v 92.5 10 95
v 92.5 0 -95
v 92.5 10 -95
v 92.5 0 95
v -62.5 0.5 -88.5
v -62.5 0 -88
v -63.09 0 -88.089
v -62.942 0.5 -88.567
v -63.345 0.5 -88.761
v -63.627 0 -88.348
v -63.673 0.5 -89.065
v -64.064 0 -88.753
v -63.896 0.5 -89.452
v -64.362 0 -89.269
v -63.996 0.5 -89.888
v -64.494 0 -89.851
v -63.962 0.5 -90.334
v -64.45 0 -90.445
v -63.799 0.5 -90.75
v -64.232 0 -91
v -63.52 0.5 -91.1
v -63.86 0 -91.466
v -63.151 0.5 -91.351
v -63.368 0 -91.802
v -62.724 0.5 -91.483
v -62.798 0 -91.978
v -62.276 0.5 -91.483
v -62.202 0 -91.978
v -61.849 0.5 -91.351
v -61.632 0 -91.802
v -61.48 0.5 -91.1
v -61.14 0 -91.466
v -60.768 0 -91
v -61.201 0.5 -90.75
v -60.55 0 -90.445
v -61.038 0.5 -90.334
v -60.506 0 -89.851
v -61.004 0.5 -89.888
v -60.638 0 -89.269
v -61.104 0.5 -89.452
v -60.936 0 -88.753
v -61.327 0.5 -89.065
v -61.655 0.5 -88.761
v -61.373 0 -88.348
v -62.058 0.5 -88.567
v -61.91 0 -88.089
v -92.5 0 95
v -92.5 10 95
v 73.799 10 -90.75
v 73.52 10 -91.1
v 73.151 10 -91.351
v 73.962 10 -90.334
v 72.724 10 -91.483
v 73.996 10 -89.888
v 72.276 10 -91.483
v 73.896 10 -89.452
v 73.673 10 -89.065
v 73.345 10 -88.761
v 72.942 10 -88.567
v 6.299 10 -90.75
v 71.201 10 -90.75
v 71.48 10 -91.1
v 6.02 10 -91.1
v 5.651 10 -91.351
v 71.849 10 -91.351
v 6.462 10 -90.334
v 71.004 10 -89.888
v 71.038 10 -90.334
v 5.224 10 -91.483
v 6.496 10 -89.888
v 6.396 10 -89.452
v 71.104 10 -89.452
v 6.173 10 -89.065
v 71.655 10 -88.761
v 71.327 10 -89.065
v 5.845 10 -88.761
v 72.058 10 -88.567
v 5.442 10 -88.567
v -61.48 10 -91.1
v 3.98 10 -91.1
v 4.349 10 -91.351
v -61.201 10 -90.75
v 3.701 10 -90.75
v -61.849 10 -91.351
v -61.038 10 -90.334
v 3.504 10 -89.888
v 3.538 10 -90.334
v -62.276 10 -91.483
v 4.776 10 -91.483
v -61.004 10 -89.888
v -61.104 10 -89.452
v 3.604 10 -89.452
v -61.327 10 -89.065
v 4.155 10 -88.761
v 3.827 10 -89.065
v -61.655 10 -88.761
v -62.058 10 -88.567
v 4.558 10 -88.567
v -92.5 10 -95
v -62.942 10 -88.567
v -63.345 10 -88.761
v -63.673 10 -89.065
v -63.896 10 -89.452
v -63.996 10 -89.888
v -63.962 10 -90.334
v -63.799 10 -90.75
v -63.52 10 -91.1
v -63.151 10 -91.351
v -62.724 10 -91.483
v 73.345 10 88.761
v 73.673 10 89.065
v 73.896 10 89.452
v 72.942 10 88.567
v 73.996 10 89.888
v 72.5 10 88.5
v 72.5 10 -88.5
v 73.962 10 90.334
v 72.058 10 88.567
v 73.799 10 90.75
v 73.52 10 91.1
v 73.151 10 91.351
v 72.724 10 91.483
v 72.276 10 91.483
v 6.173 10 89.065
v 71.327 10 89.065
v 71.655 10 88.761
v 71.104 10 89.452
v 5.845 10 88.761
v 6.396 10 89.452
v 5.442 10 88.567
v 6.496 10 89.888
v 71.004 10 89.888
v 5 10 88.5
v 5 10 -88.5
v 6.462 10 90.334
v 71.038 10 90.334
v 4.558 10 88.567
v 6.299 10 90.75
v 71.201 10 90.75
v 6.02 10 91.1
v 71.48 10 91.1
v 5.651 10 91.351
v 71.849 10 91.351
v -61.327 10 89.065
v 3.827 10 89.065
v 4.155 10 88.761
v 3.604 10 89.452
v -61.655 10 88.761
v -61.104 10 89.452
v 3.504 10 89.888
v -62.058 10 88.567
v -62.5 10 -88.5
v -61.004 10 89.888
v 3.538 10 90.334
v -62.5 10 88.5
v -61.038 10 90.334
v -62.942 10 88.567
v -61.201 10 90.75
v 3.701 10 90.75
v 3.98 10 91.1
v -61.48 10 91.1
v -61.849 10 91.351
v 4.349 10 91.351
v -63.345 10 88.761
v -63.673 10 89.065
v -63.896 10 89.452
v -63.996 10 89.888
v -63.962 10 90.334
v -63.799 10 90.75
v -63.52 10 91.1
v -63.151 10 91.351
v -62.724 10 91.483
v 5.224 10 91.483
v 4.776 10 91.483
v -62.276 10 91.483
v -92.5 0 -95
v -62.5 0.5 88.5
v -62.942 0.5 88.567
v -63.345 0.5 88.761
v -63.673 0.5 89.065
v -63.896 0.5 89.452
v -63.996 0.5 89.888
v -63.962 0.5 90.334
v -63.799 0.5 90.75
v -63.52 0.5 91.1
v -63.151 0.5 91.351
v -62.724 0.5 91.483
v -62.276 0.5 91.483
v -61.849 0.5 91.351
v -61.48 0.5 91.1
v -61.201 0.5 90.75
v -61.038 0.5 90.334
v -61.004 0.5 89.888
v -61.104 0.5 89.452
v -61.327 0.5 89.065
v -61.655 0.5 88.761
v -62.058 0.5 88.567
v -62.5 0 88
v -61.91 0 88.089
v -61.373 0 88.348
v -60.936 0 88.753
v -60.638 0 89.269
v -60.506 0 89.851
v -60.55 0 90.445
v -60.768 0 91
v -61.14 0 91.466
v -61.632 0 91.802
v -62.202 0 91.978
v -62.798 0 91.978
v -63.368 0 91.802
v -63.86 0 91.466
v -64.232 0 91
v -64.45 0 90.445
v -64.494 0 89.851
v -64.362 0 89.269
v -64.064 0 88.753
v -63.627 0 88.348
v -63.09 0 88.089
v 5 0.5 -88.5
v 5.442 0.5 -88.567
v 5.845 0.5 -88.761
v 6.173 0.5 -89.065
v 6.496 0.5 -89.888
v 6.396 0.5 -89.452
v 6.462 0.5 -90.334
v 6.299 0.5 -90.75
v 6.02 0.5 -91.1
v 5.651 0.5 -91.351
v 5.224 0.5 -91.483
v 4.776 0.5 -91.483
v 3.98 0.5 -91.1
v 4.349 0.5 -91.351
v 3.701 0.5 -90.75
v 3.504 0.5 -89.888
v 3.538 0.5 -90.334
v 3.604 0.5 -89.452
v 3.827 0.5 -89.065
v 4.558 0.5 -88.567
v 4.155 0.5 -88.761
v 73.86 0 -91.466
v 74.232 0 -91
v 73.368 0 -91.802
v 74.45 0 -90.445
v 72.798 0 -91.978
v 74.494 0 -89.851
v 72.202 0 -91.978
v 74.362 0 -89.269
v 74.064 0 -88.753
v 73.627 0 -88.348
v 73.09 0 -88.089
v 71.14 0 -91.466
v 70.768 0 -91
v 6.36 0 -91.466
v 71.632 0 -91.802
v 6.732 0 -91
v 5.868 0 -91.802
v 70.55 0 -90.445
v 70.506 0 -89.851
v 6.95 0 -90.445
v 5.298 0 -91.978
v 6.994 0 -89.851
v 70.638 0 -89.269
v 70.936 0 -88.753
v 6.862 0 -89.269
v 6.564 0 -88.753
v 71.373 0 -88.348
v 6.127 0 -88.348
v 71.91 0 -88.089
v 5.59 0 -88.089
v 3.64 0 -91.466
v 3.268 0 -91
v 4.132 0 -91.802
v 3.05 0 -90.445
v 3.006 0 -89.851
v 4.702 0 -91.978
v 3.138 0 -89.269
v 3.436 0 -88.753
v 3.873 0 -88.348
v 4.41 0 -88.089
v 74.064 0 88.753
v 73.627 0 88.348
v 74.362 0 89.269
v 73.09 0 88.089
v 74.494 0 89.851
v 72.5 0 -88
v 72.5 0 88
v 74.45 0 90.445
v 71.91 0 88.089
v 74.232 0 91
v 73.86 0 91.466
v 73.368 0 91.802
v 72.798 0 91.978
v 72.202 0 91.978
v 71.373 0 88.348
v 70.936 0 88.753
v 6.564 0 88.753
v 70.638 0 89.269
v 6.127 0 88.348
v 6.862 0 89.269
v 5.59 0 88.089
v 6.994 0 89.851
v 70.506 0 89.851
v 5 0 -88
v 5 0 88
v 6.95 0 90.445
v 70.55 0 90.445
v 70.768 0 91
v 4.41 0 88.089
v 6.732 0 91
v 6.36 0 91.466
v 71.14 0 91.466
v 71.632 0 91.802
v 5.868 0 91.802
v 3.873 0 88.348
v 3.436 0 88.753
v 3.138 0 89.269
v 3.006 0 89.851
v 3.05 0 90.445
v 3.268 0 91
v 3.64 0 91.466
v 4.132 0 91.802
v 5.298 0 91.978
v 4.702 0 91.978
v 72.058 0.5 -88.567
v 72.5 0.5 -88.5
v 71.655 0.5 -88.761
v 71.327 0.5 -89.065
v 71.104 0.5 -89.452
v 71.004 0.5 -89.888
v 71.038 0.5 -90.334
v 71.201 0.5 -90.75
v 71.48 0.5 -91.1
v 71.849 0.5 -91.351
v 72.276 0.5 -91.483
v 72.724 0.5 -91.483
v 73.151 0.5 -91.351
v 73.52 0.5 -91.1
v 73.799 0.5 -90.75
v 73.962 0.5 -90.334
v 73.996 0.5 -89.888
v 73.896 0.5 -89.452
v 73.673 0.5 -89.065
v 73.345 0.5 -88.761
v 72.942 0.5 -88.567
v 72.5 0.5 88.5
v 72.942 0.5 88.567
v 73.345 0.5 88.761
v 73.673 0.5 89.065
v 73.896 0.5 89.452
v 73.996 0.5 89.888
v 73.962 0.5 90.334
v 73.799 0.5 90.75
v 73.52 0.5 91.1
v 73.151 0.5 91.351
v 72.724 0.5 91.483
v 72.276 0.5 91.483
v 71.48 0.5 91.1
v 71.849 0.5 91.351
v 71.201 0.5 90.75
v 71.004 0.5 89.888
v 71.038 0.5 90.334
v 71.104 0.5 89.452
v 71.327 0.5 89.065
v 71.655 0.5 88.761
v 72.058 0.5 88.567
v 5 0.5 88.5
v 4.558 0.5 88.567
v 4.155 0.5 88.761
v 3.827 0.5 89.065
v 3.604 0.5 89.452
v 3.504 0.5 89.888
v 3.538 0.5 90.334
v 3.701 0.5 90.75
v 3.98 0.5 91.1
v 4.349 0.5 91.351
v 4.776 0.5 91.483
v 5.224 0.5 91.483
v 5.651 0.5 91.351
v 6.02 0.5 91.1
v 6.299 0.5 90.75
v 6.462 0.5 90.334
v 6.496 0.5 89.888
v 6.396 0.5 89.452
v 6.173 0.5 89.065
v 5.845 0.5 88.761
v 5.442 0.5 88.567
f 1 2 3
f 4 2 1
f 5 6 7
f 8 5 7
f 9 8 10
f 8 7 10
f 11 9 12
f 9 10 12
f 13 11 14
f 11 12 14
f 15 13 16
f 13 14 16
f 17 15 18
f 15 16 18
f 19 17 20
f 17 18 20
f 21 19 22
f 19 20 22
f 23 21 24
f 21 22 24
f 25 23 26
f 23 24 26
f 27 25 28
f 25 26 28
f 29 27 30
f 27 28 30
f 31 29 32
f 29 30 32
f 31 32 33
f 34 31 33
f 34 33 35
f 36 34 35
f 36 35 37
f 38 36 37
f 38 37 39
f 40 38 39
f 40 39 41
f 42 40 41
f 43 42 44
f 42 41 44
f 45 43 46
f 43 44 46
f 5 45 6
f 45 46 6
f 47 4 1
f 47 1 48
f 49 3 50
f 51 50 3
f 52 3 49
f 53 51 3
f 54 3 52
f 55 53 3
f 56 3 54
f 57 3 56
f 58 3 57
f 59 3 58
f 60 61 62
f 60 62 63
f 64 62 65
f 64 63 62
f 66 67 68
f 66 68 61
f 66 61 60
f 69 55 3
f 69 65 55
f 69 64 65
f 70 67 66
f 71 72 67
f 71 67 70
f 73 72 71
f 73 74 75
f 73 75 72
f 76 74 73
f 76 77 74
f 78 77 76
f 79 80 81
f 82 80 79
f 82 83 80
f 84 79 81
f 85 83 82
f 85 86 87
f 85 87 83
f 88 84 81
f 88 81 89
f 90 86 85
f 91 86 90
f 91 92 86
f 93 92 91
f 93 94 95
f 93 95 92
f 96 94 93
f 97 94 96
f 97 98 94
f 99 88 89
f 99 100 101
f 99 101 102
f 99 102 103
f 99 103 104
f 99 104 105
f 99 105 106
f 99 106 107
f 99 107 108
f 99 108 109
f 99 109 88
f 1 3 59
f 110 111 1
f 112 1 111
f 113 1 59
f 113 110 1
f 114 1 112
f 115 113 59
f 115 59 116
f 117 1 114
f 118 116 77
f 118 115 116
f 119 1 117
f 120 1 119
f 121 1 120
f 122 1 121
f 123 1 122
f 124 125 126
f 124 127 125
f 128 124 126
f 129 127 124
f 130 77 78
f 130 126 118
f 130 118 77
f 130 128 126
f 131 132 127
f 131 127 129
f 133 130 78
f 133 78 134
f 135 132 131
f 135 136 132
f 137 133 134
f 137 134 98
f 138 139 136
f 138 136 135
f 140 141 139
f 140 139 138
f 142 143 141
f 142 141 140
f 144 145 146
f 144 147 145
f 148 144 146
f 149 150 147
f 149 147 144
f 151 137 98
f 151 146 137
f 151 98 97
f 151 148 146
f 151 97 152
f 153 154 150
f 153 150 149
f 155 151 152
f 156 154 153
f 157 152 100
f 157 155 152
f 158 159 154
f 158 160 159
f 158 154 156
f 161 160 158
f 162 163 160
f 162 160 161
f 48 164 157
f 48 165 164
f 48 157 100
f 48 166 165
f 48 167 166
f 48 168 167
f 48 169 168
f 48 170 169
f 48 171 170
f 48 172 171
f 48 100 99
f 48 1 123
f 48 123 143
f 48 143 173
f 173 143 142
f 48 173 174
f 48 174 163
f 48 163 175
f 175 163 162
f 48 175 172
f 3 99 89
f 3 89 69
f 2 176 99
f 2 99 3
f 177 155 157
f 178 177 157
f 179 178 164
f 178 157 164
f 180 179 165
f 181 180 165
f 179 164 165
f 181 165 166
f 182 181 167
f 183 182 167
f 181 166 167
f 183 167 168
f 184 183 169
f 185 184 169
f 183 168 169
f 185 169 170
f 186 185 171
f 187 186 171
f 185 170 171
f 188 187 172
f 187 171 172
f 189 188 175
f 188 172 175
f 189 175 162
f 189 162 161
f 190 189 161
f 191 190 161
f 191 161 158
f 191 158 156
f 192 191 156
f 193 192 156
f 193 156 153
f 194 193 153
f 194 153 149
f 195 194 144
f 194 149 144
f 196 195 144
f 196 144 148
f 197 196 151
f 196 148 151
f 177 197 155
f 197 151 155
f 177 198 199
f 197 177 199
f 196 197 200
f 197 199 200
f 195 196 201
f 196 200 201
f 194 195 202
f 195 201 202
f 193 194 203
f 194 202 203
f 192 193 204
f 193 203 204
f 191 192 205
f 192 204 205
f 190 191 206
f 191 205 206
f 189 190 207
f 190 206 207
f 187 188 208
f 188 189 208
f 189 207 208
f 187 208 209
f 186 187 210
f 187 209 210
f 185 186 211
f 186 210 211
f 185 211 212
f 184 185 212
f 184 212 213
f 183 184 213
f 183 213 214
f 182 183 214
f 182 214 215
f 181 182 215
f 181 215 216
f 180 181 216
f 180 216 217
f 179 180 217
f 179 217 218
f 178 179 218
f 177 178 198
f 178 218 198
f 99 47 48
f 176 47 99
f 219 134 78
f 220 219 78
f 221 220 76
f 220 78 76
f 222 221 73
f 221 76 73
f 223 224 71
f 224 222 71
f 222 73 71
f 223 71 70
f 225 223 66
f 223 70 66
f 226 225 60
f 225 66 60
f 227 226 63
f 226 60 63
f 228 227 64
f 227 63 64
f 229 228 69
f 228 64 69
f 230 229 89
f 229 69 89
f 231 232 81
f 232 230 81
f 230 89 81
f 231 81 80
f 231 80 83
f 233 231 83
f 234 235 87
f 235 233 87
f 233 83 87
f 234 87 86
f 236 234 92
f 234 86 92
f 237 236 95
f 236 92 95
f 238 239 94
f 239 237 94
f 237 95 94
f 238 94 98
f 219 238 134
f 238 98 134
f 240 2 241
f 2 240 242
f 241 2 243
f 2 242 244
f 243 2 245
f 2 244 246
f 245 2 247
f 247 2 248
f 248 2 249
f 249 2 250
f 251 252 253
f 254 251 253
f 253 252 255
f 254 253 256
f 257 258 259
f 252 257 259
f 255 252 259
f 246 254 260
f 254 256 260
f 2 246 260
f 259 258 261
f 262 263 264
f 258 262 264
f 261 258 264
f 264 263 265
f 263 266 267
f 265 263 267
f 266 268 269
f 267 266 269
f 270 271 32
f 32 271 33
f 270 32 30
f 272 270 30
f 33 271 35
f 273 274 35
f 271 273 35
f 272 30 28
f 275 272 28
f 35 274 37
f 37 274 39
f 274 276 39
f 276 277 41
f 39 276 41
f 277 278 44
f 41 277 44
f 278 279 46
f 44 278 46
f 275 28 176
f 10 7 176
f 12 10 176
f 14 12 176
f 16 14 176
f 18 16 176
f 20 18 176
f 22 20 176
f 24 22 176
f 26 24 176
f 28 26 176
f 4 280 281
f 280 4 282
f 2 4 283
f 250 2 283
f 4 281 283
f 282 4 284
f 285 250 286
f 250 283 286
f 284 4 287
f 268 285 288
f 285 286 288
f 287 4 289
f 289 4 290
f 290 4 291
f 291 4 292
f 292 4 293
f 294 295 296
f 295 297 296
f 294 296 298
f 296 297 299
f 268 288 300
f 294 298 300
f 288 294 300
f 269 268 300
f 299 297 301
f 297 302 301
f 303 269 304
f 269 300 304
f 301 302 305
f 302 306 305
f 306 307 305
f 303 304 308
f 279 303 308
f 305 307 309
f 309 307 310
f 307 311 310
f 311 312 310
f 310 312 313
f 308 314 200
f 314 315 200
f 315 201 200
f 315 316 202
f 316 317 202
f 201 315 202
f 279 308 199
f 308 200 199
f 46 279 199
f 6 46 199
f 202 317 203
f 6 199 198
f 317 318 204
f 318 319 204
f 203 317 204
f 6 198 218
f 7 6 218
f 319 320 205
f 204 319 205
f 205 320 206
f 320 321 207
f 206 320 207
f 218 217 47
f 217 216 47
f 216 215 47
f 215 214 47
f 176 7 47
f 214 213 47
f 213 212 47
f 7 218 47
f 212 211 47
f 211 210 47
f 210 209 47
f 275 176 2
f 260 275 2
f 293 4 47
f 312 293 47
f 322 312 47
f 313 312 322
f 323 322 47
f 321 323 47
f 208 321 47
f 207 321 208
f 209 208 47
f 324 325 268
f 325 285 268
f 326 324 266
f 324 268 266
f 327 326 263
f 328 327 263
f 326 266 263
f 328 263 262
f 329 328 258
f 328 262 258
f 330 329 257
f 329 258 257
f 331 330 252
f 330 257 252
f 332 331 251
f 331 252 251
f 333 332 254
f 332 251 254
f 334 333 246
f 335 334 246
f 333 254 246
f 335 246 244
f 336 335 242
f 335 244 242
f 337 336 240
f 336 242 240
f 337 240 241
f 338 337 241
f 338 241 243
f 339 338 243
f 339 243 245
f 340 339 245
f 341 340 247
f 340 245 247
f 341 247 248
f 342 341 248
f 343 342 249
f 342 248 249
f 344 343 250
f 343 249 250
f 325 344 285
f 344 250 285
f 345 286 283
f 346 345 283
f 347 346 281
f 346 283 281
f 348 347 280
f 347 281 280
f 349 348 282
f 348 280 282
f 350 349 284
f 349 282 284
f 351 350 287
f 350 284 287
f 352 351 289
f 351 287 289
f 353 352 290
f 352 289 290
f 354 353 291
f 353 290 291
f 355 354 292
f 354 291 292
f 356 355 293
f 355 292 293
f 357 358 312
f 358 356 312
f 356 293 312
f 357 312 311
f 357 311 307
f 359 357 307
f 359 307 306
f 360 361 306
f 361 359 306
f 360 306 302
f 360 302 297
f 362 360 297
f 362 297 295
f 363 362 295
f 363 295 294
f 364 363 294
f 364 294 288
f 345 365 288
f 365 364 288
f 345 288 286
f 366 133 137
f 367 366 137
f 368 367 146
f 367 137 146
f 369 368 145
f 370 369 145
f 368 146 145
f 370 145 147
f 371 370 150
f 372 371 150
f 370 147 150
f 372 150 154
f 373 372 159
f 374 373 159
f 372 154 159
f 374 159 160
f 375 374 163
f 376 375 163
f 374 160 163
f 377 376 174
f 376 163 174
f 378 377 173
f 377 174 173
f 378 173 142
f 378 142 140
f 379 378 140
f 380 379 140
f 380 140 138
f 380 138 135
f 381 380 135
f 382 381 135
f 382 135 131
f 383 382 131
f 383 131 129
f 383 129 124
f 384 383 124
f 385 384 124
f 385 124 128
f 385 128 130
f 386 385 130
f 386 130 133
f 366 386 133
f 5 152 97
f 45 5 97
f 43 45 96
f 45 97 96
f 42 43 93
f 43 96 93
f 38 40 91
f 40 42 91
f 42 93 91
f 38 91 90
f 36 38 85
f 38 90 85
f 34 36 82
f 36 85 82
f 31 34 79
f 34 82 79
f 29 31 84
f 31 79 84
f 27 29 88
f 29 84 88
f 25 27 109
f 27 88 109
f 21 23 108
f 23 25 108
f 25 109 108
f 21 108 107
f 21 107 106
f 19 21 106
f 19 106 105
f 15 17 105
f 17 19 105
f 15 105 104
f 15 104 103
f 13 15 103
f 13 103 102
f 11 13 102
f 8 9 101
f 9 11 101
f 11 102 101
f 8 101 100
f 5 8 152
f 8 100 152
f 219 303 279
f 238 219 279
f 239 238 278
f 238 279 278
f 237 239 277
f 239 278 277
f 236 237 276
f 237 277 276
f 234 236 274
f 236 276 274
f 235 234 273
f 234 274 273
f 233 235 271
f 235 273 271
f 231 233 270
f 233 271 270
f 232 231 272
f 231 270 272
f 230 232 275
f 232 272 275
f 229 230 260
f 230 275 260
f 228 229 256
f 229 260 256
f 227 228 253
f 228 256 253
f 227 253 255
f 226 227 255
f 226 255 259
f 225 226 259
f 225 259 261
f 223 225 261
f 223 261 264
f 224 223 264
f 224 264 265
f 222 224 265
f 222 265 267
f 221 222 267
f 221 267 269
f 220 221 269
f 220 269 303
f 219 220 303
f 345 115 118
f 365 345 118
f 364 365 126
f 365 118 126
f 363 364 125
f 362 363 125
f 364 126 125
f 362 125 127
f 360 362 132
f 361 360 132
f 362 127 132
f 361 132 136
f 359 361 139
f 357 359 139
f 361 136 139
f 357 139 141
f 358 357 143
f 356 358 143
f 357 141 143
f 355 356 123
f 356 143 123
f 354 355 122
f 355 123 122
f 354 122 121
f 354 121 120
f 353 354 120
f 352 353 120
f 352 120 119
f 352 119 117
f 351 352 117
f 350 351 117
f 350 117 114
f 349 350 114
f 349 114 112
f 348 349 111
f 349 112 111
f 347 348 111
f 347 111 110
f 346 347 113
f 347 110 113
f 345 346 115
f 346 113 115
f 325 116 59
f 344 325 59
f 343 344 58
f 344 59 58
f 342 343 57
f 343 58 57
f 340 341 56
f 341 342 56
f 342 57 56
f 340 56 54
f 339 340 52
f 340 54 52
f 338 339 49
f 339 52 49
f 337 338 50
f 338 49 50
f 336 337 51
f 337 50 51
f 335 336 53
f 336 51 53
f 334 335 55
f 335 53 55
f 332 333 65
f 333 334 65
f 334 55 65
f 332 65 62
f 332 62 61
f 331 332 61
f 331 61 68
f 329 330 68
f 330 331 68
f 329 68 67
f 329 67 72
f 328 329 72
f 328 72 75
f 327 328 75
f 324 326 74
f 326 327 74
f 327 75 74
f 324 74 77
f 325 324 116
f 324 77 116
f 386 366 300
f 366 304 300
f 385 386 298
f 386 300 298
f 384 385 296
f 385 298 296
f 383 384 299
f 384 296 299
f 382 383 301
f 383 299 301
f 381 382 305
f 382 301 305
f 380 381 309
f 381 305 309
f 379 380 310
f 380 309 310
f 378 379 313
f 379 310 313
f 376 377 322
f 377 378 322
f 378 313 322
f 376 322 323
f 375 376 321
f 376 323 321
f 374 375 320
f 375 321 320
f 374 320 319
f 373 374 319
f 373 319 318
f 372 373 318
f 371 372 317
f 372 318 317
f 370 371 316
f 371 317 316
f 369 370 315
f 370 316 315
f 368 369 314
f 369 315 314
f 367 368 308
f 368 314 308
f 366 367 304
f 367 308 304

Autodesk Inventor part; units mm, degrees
ref_plane "YZ Plane" through (0, 0, 0) normal (1, 0, 0) x (0, 1, 0)
ref_plane "XZ Plane" through (0, 0, 0) normal (0, 1, 0) x (-1, 0, 0)
ref_plane "XY Plane" through (0, 0, 0) normal (0, 0, 1) x (1, 0, 0)
sketch "Schizzo1" plane through (0, 0, 0) normal (0, 1, 0) x (-1, 0, 0)
  line L0 (-92.5, 95) -> (92.5, 95)
  line L1 (92.5, 95) -> (92.5, -95)
  line L2 (92.5, -95) -> (-92.5, -95)
  line L3 (-92.5, -95) -> (-92.5, 95)
  line L4 (-92.5, 95) -> (92.5, -95) construction
  line L5 (92.5, 95) -> (-92.5, -95) construction
  line L6 (118.5475, 95) -> (118.5475, 92.5) construction
  line L7 (103.3404, 0) -> (-125.0969, 0) construction
  line L8 (-92.5, 105.425) -> (-72.5, 105.425) construction
  line L9 (-72.5, 105.425) -> (-72.5, 79.9214) construction
  line L10 (-107.0445, 95) -> (-107.0445, 90) construction
  line L11 (-107.0445, 90) -> (178.9219, 90) construction
  line L12 (92.5, 110.0374) -> (62.5, 110.0374) construction
  line L13 (62.5, 110.0374) -> (62.5, 64.1892) construction
  line L14 (62.5, 124.2105) -> (-5, 124.2105) construction
  line L15 (-5, 124.2105) -> (-72.5, 124.2105) construction
  line L16 (-5, 124.2105) -> (-5, 64.1892) construction
  point P0 (0, 0)
  point P1 (62.5, 90)
  point P2 (-72.5, 90)
  point P3 (-5, 90)
  dimension "d0" = 185
  dimension "d1" = 190
  dimension "d39" = 20
  dimension "d40" = 5
  dimension "d41" = 30
  dimension "d57" = 67.5
extrude "Estrusione1" add sketch "Schizzo1" along normal blind 10
ref_plane "Piano di lavoro1" through (-103.3404, 0, 0) normal (0, 0, 1) x (1, 0, 0)
hole "Foro5" at (-62.5, 0, 90) at (72.5, 0, 90) at (5, 0, 90) direction (0, 1, 0) diameter 3 depth 10 countersink diameter 4 countersink angle 90
mirror "Speculare4" about plane through (-103.3404, 0, 0) normal (0, 0, 1) of "Foro5"
properties part number "Coperchio"
